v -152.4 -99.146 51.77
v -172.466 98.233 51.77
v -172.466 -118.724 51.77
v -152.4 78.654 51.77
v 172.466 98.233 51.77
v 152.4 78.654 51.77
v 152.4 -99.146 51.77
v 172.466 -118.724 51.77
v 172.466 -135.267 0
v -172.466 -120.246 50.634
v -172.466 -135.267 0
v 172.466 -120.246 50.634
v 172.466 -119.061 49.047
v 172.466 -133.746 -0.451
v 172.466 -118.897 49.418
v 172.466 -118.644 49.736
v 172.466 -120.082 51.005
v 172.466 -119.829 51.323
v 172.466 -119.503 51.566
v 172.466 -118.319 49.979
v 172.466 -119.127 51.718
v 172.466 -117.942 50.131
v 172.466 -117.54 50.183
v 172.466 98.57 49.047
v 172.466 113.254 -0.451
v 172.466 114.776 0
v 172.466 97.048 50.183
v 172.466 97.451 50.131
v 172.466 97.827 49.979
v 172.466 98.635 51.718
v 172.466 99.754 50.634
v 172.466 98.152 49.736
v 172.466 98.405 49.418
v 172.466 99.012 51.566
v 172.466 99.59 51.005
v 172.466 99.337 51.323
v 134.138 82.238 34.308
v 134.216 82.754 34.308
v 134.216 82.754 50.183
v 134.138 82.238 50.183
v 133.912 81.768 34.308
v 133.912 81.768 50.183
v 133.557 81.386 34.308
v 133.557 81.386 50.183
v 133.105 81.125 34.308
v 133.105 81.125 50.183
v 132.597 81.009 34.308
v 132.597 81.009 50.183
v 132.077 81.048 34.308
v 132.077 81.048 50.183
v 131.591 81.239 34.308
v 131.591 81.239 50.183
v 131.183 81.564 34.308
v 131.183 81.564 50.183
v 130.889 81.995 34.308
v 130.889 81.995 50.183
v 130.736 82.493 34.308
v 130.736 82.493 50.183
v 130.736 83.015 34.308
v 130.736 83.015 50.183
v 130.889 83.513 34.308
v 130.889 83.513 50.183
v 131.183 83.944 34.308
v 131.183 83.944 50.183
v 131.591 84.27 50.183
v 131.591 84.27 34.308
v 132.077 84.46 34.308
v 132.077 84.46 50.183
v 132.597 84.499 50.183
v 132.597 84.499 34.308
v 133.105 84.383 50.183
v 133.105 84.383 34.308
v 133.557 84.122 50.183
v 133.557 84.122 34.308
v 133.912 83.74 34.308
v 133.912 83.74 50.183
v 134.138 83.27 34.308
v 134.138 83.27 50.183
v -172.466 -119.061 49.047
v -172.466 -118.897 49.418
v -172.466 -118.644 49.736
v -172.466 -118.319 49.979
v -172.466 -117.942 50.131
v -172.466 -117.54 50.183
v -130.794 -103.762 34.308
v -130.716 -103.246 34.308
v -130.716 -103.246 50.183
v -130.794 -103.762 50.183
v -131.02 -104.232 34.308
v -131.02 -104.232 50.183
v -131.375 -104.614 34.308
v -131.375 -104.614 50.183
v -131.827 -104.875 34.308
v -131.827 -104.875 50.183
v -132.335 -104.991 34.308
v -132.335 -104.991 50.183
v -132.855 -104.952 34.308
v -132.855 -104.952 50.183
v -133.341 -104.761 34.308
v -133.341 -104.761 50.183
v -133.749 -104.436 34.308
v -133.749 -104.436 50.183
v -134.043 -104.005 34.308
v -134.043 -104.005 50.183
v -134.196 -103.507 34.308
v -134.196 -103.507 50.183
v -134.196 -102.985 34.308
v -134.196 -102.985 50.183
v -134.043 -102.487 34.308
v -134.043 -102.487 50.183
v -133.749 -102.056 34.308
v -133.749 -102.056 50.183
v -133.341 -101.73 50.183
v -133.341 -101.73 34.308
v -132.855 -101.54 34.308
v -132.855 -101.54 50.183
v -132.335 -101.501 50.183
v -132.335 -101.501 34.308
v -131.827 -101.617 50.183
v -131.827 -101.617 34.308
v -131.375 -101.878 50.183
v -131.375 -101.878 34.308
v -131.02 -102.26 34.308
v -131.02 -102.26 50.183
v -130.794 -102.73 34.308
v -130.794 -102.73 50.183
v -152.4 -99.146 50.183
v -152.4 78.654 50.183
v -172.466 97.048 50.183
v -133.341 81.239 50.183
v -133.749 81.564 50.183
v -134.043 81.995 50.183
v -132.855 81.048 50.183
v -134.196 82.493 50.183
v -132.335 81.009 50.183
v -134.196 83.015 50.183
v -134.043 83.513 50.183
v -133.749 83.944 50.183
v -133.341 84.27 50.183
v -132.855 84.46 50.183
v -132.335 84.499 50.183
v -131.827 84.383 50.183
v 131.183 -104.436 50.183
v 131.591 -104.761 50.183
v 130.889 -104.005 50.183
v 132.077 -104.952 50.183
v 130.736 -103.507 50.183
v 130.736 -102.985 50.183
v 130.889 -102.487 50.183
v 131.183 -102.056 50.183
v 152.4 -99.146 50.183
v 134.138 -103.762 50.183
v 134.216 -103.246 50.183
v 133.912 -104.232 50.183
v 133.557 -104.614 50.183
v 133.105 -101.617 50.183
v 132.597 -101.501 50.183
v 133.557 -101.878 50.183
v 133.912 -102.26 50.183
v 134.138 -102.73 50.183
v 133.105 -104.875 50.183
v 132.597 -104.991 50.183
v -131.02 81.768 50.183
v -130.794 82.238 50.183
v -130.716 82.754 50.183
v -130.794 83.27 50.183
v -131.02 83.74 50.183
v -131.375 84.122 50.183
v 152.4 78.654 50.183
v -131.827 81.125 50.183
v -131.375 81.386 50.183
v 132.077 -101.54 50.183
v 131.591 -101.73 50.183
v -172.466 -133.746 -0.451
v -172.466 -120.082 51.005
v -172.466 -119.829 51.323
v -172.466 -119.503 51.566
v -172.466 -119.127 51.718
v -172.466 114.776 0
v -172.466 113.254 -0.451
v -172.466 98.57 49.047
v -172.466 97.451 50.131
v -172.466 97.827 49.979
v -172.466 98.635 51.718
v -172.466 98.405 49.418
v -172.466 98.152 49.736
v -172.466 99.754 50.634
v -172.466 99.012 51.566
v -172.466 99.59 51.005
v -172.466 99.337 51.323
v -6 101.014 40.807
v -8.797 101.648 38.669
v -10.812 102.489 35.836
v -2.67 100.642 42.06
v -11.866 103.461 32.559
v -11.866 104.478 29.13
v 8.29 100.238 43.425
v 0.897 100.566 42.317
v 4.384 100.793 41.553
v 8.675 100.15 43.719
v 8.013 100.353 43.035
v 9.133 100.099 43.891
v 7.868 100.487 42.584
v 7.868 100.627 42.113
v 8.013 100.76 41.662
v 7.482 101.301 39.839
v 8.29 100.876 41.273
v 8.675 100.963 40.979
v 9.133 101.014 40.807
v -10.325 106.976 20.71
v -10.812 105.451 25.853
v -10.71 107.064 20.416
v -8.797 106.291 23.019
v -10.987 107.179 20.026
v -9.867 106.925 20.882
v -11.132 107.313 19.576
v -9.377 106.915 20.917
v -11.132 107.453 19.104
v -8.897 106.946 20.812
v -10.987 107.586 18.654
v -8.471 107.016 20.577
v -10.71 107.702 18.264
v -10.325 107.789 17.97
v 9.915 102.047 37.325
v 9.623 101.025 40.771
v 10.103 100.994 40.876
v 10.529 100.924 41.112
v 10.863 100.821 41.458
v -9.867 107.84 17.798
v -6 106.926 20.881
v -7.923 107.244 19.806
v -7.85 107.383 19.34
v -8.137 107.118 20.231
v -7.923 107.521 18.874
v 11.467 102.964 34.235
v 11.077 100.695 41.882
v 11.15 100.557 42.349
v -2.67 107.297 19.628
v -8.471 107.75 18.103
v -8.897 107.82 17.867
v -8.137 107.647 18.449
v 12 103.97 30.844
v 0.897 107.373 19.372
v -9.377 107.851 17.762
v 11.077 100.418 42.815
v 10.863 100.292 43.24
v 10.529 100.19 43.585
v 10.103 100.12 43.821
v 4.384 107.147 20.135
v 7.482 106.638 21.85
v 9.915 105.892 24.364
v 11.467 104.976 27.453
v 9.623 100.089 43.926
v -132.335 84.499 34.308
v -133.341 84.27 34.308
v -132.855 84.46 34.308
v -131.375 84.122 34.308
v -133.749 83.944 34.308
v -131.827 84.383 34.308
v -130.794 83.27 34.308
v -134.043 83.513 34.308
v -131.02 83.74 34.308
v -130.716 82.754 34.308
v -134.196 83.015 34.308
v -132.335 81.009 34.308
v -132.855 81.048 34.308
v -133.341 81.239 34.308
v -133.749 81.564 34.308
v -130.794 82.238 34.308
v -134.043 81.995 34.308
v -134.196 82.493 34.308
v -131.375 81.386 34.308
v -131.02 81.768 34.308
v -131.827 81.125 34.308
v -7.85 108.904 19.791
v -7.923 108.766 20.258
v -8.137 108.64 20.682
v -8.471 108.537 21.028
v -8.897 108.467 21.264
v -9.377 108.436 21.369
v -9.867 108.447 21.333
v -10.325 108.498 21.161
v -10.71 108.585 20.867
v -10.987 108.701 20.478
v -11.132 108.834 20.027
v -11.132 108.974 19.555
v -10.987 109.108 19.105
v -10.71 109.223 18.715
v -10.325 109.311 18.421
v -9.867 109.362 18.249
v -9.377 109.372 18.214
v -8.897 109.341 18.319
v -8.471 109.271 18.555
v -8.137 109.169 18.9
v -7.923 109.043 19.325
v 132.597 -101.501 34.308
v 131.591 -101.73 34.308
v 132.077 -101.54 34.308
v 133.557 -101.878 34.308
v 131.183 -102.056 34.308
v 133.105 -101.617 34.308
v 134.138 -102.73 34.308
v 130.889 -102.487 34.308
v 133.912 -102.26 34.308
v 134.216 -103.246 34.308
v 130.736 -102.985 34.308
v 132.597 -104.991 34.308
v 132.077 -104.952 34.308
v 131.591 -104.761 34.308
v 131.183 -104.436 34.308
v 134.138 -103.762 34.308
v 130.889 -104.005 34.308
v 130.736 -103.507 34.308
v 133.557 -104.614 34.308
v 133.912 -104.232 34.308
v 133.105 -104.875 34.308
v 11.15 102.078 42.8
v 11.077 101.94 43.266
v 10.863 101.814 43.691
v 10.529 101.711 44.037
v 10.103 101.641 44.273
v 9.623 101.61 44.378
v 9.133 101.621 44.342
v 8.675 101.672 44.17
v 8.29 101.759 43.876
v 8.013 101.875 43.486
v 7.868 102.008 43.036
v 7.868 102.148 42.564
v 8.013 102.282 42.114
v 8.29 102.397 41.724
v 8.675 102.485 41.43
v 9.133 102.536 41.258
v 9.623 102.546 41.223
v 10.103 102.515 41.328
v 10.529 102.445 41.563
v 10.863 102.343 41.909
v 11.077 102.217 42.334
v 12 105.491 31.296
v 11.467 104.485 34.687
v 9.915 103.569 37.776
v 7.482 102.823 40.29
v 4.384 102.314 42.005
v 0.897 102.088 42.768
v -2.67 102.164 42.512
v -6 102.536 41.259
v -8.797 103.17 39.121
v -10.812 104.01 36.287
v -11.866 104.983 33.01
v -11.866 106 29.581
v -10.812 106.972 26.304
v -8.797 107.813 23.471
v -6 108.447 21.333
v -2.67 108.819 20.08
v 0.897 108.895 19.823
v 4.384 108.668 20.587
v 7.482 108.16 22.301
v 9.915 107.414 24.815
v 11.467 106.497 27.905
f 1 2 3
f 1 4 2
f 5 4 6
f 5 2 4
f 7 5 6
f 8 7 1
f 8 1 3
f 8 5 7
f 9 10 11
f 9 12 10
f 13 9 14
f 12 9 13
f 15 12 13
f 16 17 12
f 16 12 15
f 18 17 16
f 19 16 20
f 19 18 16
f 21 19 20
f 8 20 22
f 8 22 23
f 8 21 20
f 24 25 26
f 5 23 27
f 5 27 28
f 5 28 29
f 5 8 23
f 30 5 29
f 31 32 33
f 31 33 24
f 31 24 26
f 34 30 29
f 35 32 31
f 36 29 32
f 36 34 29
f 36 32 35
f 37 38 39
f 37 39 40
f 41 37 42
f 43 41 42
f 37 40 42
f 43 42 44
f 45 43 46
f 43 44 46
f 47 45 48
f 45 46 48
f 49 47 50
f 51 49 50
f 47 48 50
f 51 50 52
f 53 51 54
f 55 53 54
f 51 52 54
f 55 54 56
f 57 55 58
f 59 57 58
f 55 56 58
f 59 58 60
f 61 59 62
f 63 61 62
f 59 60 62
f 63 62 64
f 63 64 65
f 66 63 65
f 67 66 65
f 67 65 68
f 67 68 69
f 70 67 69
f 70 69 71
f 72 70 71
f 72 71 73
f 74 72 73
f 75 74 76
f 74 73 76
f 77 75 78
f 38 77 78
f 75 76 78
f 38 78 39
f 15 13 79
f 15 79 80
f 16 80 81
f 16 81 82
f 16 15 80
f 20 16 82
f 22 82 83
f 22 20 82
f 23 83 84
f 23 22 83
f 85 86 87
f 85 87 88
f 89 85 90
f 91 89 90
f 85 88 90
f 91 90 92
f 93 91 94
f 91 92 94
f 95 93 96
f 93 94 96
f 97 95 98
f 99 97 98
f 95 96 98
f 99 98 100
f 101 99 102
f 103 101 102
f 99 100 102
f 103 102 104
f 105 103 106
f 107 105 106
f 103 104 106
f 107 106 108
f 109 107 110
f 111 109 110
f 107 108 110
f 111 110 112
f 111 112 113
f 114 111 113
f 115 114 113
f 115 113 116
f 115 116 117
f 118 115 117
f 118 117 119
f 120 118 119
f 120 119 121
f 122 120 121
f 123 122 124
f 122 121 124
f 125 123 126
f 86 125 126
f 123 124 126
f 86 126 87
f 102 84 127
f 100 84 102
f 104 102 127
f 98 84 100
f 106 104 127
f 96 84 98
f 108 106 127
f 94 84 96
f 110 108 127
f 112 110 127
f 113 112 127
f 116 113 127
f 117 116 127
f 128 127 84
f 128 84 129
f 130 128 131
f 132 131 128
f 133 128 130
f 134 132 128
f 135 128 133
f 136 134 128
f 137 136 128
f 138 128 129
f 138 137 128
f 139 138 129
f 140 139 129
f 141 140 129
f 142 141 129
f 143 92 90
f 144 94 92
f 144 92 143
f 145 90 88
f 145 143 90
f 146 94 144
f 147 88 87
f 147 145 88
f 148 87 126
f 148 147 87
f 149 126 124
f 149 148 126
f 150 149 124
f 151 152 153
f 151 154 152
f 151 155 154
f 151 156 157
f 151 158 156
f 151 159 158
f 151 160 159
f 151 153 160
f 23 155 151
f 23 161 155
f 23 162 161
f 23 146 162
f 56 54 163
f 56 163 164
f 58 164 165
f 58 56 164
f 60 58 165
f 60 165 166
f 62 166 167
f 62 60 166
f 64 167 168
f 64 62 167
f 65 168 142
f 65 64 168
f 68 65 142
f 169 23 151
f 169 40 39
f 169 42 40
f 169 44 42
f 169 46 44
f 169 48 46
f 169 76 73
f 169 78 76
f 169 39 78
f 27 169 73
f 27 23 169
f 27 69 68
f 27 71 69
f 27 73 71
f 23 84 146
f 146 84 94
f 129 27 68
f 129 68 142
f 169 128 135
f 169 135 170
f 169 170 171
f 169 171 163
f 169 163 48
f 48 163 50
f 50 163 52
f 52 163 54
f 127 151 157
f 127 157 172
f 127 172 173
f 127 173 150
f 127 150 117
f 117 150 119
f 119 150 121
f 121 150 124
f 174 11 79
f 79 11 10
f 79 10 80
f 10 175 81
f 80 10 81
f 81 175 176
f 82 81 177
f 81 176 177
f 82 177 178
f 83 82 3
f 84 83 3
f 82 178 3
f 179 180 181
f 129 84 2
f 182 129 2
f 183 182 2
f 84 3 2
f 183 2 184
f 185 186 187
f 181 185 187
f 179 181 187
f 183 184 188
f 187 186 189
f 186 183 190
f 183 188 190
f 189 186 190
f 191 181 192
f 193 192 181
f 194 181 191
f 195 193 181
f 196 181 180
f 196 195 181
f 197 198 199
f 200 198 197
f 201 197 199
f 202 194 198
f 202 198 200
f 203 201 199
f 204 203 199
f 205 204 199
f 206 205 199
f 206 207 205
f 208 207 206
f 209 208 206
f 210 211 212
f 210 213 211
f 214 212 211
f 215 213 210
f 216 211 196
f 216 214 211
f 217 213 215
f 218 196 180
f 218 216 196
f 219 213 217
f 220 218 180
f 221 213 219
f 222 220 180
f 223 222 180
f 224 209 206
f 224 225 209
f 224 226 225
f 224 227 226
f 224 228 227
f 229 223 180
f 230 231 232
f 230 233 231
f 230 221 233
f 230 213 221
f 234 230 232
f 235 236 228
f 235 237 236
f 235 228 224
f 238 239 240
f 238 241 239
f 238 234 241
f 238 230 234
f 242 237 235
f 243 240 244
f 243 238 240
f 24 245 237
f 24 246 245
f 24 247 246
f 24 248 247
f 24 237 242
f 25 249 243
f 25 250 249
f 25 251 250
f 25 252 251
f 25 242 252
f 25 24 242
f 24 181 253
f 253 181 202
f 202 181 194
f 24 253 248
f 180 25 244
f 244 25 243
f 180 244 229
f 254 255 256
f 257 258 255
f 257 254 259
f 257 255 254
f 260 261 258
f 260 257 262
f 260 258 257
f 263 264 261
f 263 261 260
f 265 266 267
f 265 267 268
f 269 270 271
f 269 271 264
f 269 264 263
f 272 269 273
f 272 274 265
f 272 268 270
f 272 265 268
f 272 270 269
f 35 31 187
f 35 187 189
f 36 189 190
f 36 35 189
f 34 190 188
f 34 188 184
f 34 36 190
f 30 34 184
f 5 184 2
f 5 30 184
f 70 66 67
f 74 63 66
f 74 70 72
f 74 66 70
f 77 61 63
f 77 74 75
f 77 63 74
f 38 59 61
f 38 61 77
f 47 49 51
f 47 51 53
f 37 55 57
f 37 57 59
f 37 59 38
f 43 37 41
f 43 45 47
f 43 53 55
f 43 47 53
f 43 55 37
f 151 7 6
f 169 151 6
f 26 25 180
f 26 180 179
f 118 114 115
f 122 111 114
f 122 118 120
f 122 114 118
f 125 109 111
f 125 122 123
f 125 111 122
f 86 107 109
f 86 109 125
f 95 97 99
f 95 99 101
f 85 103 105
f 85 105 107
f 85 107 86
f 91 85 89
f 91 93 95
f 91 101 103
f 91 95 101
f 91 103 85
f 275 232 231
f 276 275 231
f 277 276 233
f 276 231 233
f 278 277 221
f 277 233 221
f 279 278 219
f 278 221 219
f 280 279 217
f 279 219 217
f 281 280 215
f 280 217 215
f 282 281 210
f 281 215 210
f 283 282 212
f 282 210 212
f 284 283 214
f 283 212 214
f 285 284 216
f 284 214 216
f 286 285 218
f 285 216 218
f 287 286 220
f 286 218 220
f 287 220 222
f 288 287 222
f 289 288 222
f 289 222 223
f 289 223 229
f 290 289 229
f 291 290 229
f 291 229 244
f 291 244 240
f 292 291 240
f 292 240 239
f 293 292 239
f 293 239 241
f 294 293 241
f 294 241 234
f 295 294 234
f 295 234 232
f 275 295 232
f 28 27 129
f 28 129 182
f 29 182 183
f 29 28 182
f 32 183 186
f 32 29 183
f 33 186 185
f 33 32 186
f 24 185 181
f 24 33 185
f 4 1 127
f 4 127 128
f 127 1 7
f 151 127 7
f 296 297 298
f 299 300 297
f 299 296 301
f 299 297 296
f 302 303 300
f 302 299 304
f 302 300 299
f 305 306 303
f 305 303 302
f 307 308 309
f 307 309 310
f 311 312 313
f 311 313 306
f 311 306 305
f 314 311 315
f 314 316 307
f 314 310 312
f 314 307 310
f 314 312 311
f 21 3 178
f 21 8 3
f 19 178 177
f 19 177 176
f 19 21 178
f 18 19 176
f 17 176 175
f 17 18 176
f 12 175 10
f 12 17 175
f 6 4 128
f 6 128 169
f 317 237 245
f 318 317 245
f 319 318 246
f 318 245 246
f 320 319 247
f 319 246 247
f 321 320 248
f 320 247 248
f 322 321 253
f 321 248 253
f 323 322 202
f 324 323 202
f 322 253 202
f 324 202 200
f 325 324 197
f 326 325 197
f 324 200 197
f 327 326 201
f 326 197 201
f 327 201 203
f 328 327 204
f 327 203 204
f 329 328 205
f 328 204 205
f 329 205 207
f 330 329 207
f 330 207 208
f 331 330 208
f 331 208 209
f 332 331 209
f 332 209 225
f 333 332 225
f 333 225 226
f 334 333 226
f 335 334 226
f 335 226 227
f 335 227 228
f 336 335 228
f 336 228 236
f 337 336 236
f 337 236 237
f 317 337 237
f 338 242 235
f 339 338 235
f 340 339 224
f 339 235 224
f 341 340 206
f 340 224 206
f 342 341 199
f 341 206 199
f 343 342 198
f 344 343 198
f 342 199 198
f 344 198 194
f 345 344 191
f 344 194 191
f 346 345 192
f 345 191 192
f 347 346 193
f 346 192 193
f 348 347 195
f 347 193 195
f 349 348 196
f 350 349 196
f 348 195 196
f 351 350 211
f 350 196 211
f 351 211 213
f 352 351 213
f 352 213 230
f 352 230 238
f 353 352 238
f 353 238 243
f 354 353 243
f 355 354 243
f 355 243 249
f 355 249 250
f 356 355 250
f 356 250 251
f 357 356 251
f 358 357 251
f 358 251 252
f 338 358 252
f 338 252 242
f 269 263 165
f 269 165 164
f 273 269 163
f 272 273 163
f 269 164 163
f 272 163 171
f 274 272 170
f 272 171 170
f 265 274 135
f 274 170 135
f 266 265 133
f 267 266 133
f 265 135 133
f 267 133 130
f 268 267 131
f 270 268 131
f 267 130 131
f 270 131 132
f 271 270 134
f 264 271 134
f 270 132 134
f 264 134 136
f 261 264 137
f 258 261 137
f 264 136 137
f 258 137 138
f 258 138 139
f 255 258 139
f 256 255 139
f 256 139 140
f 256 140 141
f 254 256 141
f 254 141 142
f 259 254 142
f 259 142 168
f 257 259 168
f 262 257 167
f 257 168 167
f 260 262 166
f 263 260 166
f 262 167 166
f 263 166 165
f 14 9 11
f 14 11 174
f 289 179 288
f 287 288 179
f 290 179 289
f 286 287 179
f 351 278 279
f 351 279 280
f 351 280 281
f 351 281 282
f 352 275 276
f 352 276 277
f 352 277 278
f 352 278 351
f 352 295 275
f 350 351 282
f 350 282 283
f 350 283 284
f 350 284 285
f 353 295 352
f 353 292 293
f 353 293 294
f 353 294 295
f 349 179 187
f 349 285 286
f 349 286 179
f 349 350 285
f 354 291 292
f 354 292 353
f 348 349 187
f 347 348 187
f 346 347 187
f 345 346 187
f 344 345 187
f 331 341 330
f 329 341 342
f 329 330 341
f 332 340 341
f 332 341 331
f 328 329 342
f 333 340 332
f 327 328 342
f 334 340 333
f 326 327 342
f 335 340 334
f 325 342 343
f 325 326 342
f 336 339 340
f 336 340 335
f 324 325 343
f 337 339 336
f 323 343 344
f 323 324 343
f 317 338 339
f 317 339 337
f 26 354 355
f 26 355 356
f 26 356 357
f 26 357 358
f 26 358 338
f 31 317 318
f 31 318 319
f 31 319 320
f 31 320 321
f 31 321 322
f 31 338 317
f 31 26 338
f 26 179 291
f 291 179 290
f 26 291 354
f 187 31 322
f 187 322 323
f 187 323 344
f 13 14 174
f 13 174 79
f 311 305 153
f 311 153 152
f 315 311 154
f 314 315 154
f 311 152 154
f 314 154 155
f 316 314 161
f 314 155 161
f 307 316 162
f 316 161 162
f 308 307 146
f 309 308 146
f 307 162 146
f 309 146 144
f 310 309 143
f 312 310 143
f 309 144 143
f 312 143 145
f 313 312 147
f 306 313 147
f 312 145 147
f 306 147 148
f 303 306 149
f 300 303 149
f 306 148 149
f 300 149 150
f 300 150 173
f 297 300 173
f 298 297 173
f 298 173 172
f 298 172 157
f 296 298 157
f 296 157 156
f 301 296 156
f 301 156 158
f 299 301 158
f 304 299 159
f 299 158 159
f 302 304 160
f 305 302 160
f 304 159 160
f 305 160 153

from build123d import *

# Parameters (mm, degrees)
F1_DEPTH = 172.466
F2_W     = 304.8
F2_H     = 177.8
F3_DEPTH = 12.7
F5_R     = 1.75
F6_DEPTH = 15.875
F7_D     = 3.3
F8_D     = 3.3
F9_D     = 24


# Not quite as in the source:
# - a length typed as a fraction of an inch, garbled in the dataset ("3 / 203.2 mm" for 3/8 in), is restored


with BuildPart() as f1:
    # F0 (on Right) → F1 (new body, symmetric)
    with BuildSketch(Plane.YZ):
        with BuildLine():
            Line((-120.2458515259, 50.6342471194), (-135.2673108323, 0))
            Line((-135.2673108323, 0), (-133.7458515259, -0.4513652391))
            Line((-133.7458515259, -0.4513652391), (-119.0612964359, 49.0472471194))
            ThreePointArc((-119.0612964359, 49.0472471194), (-118.4891137925, 49.8676691335), (-117.5398371295, 50.1828818803))
            Line((-117.5398371295, 50.1828818803), (97.0481340778, 50.1828818803))
            ThreePointArc((97.0481340778, 50.1828818803), (97.9974107407, 49.8676691335), (98.5695933841, 49.0472471194))
            Line((98.5695933841, 49.0472471194), (113.2541484741, -0.4513652391))
            Line((113.2541484741, -0.4513652391), (114.7756077805, 0))
            Line((114.7756077805, 0), (99.7541484741, 50.6342471194))
            ThreePointArc((99.7541484741, 50.6342471194), (99.1819658307, 51.4546691335), (98.2326891677, 51.7698818803))
            Line((98.2326891677, 51.7698818803), (-118.7243922195, 51.7698818803))
            ThreePointArc((-118.7243922195, 51.7698818803), (-119.6736688824, 51.4546691335), (-120.2458515259, 50.6342471194))
        make_face()
    extrude(amount=F1_DEPTH, both=True)

    # F2 (on face) → F3 (cut, symmetric)
    with BuildSketch(Plane.XY.offset(51.7698818803)):
        with Locations((0, -10.2458515259)):
            Rectangle(F2_W, F2_H)
    extrude(amount=F3_DEPTH, both=True, mode=Mode.SUBTRACT)

    # F5 (on face) → F6 (join)
    with BuildSketch(Plane(origin=(0, 0, 50.1828818803), x_dir=(1, 0, 0), z_dir=(0, 0, -1))):
        with Locations((132.466, -82.7541484741)):
            Circle(F5_R)
        with Locations((132.466, 103.2458515259)):
            Circle(F5_R)
        with Locations((-132.466, 103.2458515259)):
            Circle(F5_R)
        with Locations((-132.466, -82.7541484741)):
            Circle(F5_R)
    extrude(amount=F6_DEPTH)

    # F7 (through all)
    with Locations(Plane(origin=(0, 105.4912478783, 31.2956660231), x_dir=(-1, 0, 0), z_dir=(0, 0.9587015163, 0.2844141393))):
        with Locations((-9.5, 12)):
            Hole(F7_D / 2)

    # F8 (through all)
    with Locations(Plane(origin=(0, 105.4912478783, 31.2956660231), x_dir=(-1, 0, 0), z_dir=(0, 0.9587015163, 0.2844141393))):
        with Locations((9.5, -12)):
            Hole(F8_D / 2)

    # F9 (through all)
    with Locations(Plane(origin=(0, 105.4912478783, 31.2956660231), x_dir=(-1, 0, 0), z_dir=(0, 0.9587015163, 0.2844141393))):
        with Locations((0, 0)):
            Hole(F9_D / 2)


solid = f1.part
